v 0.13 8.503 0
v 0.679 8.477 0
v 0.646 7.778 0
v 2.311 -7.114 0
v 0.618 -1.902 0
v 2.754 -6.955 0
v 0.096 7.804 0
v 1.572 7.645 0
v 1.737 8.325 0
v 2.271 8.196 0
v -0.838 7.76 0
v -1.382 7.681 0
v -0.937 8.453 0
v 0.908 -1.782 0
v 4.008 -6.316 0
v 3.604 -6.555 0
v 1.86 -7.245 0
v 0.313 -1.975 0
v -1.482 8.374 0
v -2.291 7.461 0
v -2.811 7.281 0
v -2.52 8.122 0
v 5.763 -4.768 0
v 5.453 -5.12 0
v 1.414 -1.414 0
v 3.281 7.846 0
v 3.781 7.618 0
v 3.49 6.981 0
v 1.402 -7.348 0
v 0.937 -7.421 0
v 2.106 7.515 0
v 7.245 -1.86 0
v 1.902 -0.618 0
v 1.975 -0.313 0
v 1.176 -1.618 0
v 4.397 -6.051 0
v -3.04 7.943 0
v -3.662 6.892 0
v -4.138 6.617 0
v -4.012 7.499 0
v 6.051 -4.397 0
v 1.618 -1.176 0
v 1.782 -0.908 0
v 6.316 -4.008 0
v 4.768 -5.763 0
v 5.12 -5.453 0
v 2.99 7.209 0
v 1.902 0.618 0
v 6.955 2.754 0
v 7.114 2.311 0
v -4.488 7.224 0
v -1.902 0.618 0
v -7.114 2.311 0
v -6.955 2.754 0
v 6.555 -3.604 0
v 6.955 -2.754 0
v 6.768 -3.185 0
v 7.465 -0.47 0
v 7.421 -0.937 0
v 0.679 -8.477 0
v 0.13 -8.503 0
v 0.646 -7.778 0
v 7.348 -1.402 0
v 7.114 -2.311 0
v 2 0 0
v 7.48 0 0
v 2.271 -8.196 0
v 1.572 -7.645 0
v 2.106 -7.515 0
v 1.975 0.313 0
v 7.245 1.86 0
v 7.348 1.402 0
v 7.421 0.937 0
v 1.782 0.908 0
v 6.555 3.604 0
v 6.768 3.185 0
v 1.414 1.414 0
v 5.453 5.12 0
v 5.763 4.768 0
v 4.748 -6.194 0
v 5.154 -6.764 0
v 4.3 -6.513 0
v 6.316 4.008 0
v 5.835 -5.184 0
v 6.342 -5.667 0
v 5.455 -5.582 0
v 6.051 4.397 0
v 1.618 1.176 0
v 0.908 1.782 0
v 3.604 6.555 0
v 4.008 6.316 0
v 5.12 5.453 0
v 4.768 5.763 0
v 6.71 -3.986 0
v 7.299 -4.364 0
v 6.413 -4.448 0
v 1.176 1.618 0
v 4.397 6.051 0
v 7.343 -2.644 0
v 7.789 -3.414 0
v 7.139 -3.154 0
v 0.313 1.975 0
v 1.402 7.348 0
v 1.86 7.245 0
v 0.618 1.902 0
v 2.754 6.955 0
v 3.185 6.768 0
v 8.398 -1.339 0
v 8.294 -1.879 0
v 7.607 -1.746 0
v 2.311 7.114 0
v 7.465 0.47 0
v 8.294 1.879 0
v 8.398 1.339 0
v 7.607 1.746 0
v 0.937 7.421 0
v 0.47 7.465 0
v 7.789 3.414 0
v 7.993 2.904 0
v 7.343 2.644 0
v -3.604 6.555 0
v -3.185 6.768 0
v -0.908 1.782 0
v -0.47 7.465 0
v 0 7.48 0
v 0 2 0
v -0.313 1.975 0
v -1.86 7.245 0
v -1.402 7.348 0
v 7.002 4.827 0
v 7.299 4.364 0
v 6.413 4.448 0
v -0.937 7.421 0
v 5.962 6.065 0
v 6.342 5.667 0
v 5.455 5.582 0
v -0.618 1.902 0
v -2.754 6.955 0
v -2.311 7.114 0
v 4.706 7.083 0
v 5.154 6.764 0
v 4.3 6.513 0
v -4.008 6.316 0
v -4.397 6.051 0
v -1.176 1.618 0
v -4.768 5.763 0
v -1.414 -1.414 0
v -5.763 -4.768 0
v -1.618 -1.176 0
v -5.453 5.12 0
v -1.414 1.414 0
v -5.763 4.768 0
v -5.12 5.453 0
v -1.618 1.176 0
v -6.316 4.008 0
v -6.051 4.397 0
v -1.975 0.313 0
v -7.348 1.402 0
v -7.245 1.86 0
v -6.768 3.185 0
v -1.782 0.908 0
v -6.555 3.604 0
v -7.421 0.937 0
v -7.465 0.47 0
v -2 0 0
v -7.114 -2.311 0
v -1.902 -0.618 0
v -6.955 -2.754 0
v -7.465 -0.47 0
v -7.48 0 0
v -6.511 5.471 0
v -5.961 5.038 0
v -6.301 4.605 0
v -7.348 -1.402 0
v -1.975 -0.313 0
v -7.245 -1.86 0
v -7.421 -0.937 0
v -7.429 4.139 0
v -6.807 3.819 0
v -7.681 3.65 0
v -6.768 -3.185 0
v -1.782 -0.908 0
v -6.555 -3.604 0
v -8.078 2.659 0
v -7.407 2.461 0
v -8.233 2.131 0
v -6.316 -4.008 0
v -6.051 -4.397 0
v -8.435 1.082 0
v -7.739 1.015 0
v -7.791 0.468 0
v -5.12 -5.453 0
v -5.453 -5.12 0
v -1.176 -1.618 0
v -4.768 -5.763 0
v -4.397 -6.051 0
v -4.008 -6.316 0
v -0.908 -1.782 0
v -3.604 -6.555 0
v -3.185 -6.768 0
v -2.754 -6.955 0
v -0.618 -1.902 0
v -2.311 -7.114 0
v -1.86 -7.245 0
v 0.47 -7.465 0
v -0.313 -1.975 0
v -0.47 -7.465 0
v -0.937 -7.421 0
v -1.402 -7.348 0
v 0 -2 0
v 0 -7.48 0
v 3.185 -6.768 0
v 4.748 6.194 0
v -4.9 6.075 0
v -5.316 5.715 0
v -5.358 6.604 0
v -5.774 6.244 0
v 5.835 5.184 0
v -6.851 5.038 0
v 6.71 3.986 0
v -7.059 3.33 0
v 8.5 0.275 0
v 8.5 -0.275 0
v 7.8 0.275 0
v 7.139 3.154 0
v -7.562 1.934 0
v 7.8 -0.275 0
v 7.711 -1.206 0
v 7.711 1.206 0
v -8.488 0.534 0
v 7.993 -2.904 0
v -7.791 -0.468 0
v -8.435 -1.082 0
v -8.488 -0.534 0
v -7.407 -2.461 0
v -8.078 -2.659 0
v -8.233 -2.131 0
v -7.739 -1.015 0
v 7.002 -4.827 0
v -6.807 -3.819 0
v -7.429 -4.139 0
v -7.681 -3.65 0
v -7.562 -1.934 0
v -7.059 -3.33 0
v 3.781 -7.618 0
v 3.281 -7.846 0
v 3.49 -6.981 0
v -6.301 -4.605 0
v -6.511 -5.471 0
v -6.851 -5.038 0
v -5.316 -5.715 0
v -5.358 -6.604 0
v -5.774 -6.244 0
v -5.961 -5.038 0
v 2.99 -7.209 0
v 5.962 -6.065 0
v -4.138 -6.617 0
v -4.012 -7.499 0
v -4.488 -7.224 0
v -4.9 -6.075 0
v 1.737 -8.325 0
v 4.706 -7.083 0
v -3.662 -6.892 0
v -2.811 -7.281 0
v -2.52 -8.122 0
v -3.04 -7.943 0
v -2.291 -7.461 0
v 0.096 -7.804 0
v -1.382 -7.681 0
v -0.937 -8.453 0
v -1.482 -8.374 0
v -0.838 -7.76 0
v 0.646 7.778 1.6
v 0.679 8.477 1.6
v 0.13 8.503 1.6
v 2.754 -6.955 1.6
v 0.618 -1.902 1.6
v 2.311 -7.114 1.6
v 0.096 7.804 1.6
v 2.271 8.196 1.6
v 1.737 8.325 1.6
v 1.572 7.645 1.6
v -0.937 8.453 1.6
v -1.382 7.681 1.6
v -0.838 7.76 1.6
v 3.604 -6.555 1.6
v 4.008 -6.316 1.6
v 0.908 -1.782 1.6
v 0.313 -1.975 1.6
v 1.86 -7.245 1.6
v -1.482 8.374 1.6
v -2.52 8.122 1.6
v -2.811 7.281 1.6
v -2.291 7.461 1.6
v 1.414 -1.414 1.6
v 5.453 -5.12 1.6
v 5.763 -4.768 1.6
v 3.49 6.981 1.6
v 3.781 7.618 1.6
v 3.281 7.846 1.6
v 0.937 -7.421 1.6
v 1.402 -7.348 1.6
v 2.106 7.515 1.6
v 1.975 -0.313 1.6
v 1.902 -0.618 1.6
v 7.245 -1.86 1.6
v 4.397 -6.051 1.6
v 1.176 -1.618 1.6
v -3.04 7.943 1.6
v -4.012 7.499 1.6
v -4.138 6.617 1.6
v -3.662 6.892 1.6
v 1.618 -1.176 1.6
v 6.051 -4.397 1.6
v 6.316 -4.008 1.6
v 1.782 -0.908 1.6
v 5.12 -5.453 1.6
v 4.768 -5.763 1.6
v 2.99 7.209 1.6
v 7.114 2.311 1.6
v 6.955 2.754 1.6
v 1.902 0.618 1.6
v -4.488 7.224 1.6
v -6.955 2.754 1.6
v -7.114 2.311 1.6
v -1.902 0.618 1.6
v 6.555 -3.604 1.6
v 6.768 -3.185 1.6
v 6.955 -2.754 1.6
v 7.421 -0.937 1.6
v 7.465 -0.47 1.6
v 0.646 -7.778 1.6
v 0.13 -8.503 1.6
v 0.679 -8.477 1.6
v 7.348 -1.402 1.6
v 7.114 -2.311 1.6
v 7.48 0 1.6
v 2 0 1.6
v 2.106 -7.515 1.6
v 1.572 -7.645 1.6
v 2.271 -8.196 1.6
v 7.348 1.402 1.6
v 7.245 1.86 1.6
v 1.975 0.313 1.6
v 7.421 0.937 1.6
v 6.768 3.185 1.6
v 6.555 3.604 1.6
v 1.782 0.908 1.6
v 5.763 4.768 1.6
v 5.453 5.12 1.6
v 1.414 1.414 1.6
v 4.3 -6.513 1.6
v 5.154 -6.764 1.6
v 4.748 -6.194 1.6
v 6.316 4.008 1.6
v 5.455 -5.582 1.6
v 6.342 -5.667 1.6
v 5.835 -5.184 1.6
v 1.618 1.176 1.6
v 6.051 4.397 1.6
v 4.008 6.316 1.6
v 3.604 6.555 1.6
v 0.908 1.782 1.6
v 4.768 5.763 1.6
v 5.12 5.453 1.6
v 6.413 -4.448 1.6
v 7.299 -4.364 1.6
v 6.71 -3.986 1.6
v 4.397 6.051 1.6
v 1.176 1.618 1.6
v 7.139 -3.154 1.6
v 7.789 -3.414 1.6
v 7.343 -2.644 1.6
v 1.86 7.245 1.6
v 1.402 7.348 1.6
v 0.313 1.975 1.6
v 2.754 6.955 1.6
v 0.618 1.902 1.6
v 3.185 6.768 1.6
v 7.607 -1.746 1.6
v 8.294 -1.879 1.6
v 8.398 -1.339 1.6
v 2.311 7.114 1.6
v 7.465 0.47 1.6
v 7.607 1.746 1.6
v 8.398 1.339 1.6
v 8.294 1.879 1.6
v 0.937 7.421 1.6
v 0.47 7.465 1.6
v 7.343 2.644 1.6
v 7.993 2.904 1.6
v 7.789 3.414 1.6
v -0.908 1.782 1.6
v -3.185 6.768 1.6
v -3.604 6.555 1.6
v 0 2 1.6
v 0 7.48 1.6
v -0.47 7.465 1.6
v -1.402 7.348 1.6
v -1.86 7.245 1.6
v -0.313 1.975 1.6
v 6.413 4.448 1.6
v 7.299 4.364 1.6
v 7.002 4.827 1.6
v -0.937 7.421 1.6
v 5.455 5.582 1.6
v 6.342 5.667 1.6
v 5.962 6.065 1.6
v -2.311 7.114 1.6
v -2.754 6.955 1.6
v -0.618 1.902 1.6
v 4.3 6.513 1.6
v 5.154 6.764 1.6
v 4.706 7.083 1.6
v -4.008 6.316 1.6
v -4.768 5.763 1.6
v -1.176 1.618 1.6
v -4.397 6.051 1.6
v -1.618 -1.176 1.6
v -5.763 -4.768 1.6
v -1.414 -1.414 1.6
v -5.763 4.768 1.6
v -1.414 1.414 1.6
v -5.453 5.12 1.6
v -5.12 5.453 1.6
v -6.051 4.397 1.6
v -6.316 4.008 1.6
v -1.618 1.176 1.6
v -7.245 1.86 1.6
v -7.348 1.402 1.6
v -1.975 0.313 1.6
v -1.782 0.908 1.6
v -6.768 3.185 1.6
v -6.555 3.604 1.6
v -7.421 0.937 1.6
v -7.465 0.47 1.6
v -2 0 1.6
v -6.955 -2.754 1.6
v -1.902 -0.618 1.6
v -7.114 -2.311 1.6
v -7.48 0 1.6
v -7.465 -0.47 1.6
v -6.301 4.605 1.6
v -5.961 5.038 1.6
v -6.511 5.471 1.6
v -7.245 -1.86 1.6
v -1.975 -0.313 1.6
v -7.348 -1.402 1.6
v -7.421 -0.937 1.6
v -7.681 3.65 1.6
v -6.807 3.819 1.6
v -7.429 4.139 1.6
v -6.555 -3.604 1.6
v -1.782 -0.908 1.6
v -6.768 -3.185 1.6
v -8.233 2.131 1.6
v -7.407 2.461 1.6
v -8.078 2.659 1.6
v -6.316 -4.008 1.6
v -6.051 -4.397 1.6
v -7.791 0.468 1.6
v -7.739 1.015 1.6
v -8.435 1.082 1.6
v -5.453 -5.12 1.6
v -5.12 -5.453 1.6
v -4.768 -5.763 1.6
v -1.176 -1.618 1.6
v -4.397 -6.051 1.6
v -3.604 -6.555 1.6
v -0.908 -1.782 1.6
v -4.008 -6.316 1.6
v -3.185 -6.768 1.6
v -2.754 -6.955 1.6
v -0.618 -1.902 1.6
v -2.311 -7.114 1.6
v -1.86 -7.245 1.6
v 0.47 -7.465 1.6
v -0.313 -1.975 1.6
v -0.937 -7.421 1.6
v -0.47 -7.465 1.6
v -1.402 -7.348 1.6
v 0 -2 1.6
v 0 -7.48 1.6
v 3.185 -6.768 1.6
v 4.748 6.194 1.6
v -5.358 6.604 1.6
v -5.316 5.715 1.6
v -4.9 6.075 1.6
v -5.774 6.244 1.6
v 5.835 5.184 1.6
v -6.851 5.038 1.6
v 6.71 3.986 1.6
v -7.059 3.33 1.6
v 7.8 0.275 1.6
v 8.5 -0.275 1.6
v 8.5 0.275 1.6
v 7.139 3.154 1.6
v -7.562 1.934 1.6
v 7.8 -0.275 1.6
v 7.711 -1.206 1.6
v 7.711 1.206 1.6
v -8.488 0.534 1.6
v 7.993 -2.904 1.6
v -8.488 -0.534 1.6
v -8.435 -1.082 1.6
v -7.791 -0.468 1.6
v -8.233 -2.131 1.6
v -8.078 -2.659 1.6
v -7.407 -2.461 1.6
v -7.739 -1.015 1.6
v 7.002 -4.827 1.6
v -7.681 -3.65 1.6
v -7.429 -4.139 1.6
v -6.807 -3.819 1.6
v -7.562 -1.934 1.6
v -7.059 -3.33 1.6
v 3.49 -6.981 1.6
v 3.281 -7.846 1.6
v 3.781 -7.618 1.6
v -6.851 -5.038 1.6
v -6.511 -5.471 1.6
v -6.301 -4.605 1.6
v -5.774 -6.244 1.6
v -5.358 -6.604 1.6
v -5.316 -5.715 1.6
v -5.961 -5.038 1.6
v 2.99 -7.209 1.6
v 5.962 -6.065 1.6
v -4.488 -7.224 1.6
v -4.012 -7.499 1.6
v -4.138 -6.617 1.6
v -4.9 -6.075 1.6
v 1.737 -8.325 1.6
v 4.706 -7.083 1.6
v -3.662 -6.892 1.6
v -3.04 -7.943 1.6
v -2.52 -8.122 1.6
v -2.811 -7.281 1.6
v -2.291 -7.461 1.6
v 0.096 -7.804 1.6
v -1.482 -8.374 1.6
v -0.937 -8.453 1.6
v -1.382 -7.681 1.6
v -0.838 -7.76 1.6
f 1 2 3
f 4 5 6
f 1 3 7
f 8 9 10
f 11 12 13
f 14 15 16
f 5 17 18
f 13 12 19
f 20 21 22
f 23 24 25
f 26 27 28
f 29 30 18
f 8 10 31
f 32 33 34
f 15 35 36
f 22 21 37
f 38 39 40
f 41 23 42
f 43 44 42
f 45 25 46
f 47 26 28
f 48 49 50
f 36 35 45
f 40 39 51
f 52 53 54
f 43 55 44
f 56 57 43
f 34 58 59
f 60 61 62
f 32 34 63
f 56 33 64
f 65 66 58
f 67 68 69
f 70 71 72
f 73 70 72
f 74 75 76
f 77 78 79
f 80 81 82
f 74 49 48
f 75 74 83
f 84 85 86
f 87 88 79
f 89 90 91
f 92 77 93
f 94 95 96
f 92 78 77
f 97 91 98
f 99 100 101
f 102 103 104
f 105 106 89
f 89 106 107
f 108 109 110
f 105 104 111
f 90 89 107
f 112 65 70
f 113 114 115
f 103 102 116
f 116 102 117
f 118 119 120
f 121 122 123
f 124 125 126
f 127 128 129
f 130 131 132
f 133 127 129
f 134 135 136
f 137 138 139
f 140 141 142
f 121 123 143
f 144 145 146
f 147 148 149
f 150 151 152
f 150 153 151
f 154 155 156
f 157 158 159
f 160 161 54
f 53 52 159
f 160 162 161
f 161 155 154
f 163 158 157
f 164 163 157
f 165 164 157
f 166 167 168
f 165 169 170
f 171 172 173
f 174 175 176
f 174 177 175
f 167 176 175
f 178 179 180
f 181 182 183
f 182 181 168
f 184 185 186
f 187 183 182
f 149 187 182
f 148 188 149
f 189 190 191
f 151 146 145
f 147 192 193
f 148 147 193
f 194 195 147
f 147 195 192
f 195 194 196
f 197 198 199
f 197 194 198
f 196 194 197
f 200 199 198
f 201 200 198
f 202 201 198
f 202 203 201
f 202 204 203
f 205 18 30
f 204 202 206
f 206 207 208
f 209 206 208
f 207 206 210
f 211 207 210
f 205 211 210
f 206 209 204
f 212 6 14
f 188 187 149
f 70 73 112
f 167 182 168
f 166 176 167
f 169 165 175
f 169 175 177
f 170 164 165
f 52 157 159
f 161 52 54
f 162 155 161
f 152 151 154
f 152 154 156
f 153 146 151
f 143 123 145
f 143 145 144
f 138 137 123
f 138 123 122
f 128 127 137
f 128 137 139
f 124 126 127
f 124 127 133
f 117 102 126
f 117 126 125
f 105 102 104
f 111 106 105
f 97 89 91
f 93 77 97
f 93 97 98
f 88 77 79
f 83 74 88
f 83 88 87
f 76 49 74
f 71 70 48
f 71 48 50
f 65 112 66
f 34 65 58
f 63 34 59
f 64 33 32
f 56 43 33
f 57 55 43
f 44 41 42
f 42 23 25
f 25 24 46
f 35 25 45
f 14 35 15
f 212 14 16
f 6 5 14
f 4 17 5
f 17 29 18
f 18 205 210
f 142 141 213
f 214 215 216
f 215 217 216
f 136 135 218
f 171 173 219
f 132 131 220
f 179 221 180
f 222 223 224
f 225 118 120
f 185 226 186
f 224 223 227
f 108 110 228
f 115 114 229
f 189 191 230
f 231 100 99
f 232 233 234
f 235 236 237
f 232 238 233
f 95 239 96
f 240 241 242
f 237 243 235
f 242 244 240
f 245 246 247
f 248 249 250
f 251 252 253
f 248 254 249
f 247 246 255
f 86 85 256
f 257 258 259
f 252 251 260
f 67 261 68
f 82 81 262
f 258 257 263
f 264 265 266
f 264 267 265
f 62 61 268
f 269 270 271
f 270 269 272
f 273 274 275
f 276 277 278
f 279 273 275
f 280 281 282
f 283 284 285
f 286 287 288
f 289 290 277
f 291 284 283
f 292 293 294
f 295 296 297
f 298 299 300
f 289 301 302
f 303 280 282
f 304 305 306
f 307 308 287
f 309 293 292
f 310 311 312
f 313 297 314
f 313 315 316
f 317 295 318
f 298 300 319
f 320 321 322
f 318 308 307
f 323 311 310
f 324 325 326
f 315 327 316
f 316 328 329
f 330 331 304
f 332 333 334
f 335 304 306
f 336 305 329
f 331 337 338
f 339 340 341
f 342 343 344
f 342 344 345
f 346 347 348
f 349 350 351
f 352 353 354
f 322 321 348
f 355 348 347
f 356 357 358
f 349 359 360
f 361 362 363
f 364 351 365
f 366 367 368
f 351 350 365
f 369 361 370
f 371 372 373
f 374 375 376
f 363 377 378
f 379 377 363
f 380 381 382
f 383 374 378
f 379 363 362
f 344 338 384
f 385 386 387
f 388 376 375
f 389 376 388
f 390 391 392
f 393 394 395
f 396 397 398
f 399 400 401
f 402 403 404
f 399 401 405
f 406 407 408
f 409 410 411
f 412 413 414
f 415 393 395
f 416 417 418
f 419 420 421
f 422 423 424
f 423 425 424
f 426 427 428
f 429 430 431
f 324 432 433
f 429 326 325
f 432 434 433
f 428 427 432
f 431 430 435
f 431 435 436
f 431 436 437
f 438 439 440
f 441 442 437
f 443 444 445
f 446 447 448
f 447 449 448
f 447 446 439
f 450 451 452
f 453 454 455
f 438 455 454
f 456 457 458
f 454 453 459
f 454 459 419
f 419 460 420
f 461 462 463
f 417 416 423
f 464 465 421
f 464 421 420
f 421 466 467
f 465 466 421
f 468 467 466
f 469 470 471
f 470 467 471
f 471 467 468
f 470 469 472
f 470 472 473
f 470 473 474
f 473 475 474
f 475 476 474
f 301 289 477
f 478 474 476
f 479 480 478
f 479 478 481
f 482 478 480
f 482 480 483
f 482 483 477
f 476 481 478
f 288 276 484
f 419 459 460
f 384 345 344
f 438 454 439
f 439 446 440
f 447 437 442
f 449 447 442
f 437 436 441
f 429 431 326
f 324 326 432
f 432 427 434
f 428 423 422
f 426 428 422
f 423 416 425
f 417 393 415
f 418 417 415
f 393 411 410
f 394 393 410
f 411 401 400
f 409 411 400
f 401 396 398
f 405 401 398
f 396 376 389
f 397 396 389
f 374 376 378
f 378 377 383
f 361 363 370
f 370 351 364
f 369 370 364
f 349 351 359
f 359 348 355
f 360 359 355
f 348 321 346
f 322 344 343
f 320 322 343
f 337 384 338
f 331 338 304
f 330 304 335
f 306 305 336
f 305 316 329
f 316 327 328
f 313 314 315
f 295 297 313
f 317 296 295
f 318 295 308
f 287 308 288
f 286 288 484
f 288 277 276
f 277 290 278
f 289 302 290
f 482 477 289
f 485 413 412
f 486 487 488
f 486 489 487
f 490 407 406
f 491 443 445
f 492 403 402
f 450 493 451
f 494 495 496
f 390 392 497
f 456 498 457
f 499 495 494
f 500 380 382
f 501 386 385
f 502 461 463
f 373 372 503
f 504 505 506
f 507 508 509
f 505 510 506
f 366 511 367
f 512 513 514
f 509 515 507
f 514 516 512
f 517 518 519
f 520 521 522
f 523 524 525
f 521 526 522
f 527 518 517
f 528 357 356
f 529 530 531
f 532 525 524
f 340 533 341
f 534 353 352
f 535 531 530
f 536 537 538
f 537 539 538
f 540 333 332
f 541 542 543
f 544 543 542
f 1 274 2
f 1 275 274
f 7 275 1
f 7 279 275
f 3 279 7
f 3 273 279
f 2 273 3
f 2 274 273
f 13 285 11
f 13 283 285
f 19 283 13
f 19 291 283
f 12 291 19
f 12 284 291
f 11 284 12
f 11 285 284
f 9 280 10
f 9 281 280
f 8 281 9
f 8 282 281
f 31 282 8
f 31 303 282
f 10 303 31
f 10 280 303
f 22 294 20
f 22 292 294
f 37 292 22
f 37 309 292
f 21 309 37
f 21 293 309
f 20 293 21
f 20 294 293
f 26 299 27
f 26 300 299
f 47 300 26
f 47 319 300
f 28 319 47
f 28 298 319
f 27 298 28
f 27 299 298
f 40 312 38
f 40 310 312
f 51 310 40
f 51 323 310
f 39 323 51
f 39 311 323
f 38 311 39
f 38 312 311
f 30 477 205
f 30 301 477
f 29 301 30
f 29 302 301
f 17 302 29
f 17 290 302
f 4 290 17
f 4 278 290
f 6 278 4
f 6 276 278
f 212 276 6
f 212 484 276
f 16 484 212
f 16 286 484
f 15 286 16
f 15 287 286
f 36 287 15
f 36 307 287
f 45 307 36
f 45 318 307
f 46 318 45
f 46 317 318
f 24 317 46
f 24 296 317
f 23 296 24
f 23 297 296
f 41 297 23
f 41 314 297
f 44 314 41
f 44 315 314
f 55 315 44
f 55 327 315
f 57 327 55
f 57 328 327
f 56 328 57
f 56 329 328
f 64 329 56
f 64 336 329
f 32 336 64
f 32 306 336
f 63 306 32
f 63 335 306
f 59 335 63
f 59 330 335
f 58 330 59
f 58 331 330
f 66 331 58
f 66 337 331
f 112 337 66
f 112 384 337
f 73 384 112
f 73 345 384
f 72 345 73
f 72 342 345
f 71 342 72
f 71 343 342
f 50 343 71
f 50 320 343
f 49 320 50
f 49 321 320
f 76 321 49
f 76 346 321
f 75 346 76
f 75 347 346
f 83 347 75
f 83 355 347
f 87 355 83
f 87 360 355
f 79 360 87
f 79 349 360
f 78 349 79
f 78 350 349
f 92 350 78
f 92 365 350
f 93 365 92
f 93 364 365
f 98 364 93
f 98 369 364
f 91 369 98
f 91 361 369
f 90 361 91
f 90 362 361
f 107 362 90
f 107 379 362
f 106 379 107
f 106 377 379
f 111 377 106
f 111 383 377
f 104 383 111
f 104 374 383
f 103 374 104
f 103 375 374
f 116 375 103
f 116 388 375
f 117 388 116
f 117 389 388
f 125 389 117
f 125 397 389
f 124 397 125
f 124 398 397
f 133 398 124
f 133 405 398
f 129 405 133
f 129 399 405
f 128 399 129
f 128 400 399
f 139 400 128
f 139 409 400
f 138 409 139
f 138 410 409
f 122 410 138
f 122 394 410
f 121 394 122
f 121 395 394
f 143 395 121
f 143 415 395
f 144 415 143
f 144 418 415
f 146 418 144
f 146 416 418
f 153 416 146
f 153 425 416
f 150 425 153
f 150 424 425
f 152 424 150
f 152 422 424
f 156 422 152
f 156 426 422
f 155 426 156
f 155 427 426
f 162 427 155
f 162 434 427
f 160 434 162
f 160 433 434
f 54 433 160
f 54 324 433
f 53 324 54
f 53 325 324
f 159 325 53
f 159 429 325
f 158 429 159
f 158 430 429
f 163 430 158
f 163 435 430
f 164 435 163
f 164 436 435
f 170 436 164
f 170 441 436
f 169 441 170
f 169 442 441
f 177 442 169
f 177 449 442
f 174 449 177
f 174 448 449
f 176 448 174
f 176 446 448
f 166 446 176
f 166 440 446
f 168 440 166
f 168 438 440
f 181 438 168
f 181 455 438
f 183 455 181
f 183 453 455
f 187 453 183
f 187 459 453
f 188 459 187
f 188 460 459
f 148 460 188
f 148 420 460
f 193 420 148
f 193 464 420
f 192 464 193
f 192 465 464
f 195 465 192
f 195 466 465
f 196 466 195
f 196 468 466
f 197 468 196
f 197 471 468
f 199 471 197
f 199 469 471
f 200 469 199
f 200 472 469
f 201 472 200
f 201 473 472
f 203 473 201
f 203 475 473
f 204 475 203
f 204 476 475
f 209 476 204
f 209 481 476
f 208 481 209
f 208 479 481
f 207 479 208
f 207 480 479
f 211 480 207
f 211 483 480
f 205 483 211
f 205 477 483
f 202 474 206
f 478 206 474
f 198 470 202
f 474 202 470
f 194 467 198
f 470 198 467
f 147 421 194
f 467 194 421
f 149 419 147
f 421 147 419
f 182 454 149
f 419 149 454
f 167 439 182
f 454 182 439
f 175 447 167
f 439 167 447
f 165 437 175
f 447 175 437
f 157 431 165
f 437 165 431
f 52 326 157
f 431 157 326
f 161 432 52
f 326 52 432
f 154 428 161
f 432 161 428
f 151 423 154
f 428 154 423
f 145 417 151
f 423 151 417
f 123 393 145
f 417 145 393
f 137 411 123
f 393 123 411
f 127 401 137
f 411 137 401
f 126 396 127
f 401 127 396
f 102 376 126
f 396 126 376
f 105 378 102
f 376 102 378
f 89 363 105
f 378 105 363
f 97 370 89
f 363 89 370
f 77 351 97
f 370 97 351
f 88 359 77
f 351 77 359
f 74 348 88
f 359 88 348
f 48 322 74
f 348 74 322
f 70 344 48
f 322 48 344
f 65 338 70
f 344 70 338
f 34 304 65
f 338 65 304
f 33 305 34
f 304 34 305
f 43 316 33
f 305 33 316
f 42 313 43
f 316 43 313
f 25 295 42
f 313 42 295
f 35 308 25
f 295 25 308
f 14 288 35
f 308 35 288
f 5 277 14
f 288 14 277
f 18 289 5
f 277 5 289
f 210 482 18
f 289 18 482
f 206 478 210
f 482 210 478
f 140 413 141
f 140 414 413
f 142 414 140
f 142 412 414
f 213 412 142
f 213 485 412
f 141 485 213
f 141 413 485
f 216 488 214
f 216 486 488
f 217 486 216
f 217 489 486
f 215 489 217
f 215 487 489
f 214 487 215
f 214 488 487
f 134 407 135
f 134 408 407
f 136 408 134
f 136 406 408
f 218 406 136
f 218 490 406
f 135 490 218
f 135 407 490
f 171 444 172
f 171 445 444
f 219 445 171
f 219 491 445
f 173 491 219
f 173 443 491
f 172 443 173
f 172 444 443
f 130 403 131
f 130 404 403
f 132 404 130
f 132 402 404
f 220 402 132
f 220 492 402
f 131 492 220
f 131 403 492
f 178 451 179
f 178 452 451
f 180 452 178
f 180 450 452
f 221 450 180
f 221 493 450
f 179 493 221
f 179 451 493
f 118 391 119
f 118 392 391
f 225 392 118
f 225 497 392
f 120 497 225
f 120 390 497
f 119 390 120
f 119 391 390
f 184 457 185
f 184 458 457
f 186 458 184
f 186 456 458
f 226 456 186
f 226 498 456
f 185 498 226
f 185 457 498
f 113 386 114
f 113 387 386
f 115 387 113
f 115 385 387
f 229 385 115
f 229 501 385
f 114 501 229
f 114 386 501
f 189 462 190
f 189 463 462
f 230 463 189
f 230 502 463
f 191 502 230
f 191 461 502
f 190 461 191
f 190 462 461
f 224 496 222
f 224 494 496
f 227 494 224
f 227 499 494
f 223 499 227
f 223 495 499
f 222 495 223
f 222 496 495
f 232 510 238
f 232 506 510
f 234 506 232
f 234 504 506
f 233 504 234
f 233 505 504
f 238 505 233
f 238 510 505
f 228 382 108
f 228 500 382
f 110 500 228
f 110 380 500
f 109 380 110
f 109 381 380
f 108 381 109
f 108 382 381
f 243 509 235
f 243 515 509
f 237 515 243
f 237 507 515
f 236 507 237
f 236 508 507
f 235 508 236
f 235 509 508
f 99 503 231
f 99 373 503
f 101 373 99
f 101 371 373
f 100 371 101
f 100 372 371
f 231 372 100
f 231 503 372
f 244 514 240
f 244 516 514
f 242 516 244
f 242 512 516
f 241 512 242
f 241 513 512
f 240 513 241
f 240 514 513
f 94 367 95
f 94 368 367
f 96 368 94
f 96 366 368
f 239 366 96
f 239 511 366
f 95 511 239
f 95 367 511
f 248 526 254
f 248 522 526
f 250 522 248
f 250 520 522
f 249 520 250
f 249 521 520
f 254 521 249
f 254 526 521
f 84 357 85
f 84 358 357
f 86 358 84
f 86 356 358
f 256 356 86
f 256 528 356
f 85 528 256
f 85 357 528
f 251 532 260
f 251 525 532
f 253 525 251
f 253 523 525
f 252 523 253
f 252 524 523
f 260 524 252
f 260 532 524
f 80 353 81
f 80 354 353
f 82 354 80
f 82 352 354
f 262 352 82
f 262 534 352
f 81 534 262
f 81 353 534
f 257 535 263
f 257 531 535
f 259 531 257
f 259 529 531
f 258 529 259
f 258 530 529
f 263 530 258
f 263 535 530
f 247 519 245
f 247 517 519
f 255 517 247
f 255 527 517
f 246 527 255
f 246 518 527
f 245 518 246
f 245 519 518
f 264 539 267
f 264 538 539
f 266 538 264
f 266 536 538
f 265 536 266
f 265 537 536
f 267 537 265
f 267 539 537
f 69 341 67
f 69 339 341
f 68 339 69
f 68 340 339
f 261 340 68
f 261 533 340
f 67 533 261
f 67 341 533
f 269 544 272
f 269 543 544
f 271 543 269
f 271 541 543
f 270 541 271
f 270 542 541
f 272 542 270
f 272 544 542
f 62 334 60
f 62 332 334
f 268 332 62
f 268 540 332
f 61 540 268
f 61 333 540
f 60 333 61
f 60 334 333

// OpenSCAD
// part_id: b3
// name: B3 companion gear
// source_drawing_ids: DRW-002
// units: mm
// revision: 0.1
// SPDX-License-Identifier: MIT

module b3_gear_2d(outer_d = 17.2, root_d = 14.96, tooth_count = 33, bore_d = 4.0) {
    difference() {
        union() {
            circle(d = root_d, $fn = 100);
            for (i = [0 : tooth_count - 1])
                rotate(i * 360 / tooth_count)
                    translate([outer_d / 2 - 0.45, 0])
                        square([0.70, 0.55], center = true);
        }
        circle(d = bore_d, $fn = 40);
    }
}

module part_b3(thickness = 1.6) {
    linear_extrude(height = thickness)
        b3_gear_2d();
}

// ---- "main guard" ----
// Default to previewing when opened directly:
if (is_undef(__LIB_MODE__)) {
    part_b3();
}
